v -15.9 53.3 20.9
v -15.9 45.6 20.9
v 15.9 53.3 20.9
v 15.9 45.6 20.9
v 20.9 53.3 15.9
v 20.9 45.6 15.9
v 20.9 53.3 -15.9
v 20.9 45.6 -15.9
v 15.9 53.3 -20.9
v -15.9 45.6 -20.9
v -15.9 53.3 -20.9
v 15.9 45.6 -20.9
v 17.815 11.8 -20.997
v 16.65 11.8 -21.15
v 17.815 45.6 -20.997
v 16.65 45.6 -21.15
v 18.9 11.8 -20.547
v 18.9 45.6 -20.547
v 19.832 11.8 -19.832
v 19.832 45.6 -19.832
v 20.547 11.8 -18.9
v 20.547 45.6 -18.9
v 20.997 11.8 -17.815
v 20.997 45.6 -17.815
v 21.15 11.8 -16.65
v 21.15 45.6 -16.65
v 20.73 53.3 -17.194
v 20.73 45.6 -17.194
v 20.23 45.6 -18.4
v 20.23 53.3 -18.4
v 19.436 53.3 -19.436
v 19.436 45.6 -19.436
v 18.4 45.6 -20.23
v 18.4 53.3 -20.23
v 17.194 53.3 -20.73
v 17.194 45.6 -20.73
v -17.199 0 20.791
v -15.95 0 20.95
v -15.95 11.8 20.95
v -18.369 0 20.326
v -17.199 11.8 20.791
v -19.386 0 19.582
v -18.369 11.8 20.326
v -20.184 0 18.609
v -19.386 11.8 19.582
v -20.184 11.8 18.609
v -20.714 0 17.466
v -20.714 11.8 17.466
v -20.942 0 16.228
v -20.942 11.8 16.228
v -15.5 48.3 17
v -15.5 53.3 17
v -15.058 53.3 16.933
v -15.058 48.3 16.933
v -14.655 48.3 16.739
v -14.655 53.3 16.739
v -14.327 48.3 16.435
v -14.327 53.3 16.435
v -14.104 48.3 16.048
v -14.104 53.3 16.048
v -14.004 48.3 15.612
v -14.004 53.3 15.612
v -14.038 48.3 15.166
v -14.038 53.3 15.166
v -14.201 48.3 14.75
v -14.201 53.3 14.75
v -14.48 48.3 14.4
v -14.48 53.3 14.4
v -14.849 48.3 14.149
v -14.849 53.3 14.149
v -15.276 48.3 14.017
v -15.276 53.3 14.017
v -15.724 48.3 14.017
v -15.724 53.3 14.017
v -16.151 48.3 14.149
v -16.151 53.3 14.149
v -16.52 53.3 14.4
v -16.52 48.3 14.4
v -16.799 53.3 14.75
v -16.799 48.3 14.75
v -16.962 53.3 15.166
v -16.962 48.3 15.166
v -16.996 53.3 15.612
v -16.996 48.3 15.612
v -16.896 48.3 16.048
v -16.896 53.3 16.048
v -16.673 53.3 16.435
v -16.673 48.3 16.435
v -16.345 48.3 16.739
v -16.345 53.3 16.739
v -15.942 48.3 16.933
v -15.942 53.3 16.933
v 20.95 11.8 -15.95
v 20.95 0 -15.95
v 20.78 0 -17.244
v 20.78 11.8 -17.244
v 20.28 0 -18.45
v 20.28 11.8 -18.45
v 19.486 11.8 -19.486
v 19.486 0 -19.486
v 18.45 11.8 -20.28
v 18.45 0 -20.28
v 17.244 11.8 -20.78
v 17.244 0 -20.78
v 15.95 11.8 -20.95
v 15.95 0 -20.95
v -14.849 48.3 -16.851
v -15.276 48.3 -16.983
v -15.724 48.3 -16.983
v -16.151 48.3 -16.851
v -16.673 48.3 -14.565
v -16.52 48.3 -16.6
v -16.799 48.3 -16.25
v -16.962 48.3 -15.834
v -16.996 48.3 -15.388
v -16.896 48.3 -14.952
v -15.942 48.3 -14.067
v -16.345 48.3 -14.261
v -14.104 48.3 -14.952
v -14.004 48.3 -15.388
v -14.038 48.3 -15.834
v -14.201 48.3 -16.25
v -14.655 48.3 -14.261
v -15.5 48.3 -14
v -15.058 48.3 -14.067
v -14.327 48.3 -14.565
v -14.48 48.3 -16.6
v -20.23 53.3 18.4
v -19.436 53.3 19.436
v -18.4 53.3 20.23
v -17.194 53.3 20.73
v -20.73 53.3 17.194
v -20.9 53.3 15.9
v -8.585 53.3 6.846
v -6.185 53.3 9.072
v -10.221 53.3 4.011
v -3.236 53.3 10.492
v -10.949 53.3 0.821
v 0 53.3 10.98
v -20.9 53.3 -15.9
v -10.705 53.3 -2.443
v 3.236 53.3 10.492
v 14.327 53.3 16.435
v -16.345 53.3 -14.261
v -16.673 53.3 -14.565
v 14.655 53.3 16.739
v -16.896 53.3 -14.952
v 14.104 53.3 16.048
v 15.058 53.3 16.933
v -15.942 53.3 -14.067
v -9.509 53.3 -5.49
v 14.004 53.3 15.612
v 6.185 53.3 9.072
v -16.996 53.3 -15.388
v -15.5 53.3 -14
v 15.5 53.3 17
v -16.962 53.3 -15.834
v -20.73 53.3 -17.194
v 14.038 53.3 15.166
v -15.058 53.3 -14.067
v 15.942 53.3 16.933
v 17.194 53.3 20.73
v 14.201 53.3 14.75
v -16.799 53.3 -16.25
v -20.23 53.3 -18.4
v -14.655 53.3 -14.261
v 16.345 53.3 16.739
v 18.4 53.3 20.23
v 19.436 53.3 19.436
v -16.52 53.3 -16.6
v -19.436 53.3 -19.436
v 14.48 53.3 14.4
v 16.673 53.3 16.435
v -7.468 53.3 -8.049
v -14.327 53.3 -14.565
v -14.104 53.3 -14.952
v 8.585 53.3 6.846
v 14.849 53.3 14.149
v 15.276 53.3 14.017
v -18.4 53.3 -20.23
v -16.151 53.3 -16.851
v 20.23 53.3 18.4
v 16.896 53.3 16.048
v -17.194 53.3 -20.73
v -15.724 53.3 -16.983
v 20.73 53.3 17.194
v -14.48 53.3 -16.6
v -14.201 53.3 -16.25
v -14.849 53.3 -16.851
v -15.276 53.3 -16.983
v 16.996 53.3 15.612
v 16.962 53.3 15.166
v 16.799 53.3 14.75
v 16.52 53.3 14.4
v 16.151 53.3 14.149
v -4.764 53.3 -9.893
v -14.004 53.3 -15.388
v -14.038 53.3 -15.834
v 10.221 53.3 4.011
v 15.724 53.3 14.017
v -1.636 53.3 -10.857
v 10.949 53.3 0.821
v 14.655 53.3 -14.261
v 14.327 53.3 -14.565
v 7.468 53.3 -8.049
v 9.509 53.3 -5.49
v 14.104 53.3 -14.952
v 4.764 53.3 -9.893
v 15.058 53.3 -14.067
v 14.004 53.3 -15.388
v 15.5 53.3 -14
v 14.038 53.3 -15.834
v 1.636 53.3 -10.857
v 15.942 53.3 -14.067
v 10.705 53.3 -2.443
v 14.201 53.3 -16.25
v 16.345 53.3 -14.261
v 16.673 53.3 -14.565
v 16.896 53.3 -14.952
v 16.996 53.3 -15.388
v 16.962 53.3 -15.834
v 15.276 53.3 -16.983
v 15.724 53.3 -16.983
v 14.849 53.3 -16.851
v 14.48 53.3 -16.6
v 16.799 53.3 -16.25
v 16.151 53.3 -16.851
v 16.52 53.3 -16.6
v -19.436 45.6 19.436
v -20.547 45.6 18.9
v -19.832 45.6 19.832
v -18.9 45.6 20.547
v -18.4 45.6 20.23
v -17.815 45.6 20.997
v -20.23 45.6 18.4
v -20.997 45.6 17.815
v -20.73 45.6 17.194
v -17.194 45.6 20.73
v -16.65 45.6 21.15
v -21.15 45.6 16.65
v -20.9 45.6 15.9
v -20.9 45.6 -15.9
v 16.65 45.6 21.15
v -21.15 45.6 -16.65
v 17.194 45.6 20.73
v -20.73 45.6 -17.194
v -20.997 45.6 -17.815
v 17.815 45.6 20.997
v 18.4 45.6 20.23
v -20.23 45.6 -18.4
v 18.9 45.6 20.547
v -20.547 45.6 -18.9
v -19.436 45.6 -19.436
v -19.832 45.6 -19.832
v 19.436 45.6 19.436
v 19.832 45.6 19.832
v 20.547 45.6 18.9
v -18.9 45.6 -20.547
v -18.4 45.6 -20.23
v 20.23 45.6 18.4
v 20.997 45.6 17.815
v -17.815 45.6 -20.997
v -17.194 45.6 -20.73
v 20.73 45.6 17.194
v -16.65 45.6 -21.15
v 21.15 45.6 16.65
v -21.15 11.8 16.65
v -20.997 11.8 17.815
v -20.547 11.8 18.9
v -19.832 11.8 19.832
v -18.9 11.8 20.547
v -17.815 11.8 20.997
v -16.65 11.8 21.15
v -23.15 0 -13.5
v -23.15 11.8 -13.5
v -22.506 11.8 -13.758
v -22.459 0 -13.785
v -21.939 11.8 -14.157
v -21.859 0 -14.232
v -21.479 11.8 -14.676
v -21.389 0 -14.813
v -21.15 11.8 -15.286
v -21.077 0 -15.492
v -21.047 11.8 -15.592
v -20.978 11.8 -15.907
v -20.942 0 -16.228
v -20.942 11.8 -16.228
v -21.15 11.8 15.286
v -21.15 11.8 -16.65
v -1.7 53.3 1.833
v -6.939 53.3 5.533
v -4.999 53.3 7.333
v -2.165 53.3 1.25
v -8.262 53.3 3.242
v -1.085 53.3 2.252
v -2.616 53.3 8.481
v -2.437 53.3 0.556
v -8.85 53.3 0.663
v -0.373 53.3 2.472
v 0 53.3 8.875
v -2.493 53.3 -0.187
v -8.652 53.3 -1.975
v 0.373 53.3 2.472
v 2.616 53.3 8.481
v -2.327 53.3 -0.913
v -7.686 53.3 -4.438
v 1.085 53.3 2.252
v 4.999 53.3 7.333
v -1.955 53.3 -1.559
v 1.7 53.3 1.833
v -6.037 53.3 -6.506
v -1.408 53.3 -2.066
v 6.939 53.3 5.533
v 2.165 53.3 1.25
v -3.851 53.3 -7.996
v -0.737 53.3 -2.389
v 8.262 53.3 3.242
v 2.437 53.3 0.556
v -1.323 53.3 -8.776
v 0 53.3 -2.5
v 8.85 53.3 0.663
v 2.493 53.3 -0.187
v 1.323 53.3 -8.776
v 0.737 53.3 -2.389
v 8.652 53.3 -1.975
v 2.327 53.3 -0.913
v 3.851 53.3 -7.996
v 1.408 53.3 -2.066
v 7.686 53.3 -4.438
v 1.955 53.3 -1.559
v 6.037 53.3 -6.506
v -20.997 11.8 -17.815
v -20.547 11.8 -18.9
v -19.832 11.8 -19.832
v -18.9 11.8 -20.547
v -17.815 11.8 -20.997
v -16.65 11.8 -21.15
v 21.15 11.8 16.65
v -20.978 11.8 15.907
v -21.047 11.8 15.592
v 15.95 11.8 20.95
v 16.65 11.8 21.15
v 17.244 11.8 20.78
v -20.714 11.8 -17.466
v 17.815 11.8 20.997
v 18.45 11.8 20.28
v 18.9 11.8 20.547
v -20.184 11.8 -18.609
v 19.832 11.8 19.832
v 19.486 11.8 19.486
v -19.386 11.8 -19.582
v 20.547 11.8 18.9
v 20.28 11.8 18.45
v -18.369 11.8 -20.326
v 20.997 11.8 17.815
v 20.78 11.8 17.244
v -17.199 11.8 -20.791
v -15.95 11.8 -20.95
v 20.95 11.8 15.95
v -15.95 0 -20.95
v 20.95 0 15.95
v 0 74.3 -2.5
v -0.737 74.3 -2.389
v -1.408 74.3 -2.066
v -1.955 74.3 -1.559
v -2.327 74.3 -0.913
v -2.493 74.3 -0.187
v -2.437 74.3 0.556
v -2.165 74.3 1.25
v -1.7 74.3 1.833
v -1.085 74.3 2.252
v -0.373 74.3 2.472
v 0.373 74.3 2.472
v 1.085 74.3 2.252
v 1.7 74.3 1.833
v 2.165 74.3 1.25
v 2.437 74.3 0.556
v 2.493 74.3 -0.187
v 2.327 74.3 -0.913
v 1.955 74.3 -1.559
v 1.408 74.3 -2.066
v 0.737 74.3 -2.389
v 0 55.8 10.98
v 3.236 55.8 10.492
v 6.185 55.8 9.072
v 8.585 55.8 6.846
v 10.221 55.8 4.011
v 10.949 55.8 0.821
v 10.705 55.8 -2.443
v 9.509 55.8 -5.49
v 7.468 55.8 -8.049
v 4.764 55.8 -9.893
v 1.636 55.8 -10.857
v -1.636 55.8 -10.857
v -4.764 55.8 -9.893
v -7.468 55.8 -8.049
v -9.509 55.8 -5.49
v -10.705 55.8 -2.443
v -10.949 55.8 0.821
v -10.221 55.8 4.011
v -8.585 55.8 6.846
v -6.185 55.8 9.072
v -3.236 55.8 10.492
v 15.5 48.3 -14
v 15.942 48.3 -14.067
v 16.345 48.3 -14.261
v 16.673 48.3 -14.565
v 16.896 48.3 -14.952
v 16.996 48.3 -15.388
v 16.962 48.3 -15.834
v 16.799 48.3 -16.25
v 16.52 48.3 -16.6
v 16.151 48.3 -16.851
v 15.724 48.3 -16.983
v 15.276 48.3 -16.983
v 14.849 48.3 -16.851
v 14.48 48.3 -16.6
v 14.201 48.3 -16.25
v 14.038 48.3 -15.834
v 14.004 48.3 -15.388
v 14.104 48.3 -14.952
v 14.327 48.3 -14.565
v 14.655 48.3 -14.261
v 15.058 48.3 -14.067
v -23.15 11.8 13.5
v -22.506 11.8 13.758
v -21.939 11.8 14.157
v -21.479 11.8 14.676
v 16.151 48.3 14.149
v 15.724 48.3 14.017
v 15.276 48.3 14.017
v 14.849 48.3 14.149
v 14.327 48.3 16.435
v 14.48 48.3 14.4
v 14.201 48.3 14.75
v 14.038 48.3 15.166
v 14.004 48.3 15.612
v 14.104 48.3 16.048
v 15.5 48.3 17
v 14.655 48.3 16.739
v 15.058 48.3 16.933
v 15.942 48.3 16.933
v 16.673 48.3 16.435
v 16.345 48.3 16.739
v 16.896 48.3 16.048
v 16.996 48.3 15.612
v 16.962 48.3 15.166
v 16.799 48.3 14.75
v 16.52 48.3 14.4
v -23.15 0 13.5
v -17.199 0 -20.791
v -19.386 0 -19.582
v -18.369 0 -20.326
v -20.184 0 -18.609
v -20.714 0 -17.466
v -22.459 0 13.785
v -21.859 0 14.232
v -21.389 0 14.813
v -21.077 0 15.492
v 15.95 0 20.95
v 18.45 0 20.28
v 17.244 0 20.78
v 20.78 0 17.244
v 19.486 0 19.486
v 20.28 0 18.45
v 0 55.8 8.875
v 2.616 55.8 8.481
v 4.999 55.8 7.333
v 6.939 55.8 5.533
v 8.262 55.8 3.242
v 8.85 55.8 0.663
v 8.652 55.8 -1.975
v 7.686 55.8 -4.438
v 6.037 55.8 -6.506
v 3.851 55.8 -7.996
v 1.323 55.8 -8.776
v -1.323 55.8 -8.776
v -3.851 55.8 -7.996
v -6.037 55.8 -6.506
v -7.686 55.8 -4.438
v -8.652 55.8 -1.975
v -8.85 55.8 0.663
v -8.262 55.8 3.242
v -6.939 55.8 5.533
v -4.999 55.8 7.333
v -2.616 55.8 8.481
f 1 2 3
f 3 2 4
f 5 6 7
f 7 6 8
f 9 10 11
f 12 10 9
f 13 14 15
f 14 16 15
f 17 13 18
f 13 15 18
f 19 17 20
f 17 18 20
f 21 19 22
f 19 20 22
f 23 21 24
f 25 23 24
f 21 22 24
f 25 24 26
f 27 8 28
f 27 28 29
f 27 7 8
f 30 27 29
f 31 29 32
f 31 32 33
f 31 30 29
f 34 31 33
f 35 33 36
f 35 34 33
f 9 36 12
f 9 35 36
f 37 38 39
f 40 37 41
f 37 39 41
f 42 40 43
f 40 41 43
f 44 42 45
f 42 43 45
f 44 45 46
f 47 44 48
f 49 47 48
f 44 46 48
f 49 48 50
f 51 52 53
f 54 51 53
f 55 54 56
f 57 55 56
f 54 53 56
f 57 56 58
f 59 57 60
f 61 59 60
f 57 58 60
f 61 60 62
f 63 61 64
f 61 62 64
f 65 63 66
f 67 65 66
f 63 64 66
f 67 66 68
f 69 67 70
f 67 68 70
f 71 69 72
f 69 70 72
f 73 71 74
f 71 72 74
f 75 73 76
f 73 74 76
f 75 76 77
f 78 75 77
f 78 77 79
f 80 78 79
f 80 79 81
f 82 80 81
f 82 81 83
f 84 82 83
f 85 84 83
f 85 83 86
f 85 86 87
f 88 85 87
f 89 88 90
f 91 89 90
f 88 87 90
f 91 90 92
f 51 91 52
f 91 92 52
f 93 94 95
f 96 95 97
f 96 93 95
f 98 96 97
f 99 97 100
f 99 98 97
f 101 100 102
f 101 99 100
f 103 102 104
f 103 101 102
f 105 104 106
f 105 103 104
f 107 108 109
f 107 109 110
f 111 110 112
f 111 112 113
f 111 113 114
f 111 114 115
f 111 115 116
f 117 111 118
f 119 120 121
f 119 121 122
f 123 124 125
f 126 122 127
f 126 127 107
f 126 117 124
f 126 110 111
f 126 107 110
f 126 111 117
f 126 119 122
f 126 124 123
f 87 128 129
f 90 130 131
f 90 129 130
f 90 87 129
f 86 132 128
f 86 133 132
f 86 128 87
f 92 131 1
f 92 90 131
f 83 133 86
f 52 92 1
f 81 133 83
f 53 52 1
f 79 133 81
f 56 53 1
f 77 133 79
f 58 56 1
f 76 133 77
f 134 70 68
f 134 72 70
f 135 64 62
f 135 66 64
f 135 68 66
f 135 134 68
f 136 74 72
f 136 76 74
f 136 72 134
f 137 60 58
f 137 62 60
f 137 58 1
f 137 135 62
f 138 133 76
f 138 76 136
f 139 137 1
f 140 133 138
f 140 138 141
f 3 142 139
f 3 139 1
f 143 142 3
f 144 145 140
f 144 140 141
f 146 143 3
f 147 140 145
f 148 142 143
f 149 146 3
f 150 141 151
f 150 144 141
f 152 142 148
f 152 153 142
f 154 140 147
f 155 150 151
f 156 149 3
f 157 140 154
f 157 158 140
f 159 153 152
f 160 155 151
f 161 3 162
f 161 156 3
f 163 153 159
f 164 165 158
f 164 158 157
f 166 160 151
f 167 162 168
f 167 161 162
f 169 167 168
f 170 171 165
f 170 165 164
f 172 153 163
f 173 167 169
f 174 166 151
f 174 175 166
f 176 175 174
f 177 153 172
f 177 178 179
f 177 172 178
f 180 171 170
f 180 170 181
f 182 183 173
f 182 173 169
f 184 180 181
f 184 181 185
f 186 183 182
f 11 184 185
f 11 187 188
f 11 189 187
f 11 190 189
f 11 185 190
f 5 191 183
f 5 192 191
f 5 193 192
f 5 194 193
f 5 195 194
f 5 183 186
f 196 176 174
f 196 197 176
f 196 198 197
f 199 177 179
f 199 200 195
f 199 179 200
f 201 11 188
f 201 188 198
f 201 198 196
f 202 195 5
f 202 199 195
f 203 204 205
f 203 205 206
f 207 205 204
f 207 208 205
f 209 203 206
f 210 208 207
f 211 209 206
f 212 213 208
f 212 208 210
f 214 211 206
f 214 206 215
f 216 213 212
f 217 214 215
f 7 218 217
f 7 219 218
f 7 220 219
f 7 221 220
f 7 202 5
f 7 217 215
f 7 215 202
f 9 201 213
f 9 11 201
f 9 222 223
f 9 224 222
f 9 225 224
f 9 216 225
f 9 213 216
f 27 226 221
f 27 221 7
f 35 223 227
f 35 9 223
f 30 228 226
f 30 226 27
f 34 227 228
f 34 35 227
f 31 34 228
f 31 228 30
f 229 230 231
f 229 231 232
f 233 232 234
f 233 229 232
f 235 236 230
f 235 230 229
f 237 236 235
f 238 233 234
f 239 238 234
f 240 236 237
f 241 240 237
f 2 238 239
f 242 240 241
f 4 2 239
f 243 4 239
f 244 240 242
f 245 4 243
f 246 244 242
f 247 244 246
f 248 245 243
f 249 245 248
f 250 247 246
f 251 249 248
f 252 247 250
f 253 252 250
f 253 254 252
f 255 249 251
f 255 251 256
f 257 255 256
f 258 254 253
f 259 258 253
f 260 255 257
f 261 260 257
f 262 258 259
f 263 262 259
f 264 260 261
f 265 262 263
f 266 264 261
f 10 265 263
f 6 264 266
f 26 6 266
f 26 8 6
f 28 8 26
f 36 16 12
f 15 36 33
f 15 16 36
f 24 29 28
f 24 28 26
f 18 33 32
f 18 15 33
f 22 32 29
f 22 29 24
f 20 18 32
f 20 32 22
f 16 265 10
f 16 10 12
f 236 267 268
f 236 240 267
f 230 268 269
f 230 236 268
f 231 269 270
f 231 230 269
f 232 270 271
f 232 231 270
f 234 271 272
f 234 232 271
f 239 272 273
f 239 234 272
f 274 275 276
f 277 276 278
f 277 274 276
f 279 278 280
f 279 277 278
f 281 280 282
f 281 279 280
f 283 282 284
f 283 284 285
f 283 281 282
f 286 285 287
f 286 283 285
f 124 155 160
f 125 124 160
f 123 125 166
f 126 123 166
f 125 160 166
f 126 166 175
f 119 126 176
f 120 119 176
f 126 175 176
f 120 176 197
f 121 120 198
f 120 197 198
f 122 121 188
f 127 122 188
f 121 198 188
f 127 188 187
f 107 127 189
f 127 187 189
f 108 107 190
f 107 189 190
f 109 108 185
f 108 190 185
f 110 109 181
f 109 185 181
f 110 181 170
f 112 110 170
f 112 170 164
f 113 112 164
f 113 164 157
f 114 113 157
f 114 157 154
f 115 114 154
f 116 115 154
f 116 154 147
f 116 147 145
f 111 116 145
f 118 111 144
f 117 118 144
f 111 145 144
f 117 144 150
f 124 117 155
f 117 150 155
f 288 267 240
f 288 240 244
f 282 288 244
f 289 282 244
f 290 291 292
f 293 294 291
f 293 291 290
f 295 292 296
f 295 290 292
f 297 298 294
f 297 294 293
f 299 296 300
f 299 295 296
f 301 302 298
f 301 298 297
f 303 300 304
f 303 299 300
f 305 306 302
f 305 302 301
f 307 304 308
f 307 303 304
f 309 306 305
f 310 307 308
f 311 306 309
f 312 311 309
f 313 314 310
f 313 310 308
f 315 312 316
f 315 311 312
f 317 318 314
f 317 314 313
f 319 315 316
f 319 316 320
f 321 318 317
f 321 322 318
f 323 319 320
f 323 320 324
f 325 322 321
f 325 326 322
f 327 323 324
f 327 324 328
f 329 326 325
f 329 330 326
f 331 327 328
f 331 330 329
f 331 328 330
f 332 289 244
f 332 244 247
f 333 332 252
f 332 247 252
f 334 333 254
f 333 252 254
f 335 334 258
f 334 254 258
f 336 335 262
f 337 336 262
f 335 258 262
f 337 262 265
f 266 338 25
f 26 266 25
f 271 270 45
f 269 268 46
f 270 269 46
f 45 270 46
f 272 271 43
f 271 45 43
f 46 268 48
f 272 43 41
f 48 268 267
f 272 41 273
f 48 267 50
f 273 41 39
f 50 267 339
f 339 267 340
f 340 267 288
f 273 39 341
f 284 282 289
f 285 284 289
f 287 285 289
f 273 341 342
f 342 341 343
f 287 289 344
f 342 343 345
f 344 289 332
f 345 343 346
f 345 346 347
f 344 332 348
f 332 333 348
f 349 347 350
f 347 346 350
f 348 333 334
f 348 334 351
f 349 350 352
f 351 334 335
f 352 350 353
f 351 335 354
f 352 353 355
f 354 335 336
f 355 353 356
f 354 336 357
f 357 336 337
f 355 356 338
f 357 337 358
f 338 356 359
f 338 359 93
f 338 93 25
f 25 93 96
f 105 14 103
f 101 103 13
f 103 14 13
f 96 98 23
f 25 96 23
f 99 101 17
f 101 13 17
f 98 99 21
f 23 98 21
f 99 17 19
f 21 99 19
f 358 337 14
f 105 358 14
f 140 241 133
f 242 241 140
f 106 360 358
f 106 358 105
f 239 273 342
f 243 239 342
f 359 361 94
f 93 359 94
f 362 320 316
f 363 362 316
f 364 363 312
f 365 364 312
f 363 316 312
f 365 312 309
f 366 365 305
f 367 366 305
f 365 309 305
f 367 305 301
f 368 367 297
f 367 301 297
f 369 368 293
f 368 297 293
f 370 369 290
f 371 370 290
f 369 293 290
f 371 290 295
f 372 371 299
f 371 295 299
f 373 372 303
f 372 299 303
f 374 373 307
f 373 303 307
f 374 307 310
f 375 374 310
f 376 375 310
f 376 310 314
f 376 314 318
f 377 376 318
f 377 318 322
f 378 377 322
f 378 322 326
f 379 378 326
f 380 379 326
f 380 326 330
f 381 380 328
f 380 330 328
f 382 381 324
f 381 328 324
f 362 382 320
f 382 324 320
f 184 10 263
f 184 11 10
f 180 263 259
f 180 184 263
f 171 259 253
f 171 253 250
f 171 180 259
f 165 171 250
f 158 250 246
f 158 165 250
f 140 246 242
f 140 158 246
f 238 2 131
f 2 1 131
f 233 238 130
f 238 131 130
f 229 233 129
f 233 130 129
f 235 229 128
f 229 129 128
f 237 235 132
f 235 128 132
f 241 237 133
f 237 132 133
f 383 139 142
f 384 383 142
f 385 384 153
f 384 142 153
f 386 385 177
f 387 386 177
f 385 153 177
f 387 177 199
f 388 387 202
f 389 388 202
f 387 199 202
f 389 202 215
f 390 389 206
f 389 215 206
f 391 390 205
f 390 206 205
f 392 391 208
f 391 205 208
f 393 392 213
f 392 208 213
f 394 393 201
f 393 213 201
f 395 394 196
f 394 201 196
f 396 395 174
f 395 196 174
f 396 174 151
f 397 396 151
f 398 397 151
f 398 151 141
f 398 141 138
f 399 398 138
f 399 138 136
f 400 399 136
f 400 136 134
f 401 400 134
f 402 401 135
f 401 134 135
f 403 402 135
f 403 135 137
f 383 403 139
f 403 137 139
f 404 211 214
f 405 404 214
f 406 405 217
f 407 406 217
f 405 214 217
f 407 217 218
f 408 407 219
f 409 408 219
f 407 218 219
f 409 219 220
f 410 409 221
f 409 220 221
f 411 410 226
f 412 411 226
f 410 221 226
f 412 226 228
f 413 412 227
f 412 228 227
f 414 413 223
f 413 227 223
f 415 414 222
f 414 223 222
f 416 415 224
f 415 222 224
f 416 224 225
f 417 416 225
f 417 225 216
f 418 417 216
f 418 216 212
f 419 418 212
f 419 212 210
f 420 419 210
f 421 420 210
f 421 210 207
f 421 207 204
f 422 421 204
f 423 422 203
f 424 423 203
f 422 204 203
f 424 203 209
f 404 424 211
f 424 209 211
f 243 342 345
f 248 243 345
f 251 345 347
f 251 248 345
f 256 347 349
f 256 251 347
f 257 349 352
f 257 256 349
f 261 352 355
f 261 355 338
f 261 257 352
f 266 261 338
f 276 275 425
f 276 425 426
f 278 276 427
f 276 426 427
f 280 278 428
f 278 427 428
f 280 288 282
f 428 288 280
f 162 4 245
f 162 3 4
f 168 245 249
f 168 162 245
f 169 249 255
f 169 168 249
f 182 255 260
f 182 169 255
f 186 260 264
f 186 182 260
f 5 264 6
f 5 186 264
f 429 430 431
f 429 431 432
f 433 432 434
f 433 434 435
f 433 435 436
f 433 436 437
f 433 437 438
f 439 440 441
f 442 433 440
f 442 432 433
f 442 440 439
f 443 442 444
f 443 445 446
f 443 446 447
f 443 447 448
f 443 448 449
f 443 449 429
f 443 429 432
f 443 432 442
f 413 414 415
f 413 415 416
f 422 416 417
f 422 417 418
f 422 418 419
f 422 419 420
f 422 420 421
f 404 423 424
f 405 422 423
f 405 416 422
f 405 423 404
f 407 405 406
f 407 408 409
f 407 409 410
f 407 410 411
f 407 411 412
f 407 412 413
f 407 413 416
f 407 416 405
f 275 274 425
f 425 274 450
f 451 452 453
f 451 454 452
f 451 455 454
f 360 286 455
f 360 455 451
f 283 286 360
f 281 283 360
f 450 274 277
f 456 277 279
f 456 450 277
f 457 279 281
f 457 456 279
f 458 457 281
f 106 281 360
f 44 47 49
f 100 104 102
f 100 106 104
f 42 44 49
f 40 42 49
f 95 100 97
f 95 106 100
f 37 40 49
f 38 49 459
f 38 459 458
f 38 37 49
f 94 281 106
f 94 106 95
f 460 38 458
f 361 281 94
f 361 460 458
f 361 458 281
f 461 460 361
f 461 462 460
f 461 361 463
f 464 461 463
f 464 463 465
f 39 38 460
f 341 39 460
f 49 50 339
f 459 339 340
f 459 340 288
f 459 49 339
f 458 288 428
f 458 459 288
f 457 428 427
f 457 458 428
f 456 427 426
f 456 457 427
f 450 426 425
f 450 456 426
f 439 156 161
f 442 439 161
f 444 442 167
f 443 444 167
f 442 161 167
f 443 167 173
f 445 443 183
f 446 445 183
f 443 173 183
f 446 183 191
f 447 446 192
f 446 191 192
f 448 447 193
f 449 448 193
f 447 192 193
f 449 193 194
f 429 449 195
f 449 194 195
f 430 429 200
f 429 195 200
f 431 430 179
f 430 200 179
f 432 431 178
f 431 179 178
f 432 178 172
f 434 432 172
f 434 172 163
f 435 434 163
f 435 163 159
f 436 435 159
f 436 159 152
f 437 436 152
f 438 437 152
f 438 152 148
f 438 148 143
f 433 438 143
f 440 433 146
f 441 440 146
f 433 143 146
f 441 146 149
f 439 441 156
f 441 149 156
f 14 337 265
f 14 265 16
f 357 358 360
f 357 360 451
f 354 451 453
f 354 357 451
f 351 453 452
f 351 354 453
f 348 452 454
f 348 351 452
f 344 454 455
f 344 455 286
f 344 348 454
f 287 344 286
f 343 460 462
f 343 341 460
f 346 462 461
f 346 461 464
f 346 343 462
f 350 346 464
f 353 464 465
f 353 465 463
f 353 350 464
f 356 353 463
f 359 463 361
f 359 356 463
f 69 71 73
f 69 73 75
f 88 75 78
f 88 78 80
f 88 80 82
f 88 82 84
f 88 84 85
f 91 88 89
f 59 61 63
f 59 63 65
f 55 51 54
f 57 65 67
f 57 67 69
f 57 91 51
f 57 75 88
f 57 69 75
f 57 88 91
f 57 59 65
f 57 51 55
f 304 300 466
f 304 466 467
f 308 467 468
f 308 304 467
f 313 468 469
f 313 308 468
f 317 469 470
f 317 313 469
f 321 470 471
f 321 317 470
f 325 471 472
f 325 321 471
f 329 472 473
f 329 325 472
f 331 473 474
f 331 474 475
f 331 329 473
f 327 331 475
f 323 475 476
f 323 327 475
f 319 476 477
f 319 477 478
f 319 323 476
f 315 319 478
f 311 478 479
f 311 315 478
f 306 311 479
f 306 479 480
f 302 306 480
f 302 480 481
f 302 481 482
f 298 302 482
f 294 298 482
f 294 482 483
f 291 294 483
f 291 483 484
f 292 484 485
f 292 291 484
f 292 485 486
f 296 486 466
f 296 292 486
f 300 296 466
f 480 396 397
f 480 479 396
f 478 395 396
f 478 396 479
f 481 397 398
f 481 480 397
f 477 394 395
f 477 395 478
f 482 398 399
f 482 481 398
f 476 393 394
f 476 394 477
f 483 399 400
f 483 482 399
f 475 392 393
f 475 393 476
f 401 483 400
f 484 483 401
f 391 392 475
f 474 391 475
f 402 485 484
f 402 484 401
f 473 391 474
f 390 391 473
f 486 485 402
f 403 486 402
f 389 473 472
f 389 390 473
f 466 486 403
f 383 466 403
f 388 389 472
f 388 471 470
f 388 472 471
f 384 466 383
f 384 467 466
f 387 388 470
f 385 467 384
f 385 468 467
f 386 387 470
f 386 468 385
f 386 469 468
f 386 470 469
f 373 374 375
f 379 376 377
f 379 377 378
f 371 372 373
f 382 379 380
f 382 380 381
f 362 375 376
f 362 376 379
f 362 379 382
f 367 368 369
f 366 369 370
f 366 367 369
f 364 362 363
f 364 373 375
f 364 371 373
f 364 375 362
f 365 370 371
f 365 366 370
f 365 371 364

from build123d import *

# Parameters (mm, degrees)
SKETCH1_W           = 41.9
SKETCH1_H           = 41.9
BOSS_EXTRUDE1_DEPTH = 11.8
SKETCH2_W           = 42.3
SKETCH2_H           = 42.3
BOSS_EXTRUDE2_DEPTH = 33.8
SKETCH3_W           = 41.8
SKETCH3_H           = 41.8
BOSS_EXTRUDE3_DEPTH = 7.7
SKETCH4_R           = 10.98
SKETCH4_R_2         = 8.875
BOSS_EXTRUDE4_DEPTH = 2.5
FILLET1_R           = 5
FILLET3_R           = 4.5
SKETCH5_R           = 2.5
BOSS_EXTRUDE5_DEPTH = 21
SKETCH6_R           = 1.5
CUT_EXTRUDE1_DEPTH  = 5
SKETCH7_W           = 2.2
SKETCH7_H           = 27
BOSS_EXTRUDE6_DEPTH = 11.8
FILLET5_R           = 3


with BuildPart() as part:
    # Sketch1 → Boss-Extrude1 (new body)
    with BuildSketch(Plane(origin=(0, 0, 0), x_dir=(1, 0, 0), z_dir=(0, 1, 0))):
        Rectangle(SKETCH1_W, SKETCH1_H)
    extrude(amount=BOSS_EXTRUDE1_DEPTH)

    # Sketch2 → Boss-Extrude2 (add)
    with BuildSketch(Plane(origin=(0, 11.8, 0), x_dir=(1, 0, 0), z_dir=(0, 1, 0))):
        Rectangle(SKETCH2_W, SKETCH2_H)
    extrude(amount=BOSS_EXTRUDE2_DEPTH)

    # Sketch3 → Boss-Extrude3 (add)
    with BuildSketch(Plane(origin=(0, 45.6, 0), x_dir=(1, 0, 0), z_dir=(0, 1, 0))):
        Rectangle(SKETCH3_W, SKETCH3_H)
    extrude(amount=BOSS_EXTRUDE3_DEPTH)

    # Sketch4 → Boss-Extrude4 (add)
    with BuildSketch(Plane(origin=(0, 53.3, 0), x_dir=(1, 0, 0), z_dir=(0, 1, 0))):
        with Locations(Location((0, 0, 0), (0, 0, 270))):
            Circle(SKETCH4_R)
        with Locations(Location((0, 0, 0), (0, 0, 270))):
            Circle(SKETCH4_R_2, mode=Mode.SUBTRACT)
    extrude(amount=BOSS_EXTRUDE4_DEPTH)

    # Fillet1
    fillet1_edges = [part.edges().sort_by_distance(p)[0] for p in [
        (-20.9, 49.45, -20.9),
        (-20.9, 49.45, 20.9),
        (20.9, 49.45, 20.9),
        (20.9, 49.45, -20.9),
        (-20.95, 5.9, -20.95),
        (20.95, 5.9, -20.95),
        (20.95, 5.9, 20.95),
        (-20.95, 5.9, 20.95),
    ]]
    fillet(fillet1_edges, radius=FILLET1_R)

    # Fillet3
    fillet3_edges = [part.edges().sort_by_distance(p)[0] for p in [
        (-21.15, 28.7, -21.15),
        (-21.15, 28.7, 21.15),
        (21.15, 28.7, 21.15),
        (21.15, 28.7, -21.15),
    ]]
    fillet(fillet3_edges, radius=FILLET3_R)

    # Sketch5 → Boss-Extrude5 (add)
    with BuildSketch(Plane(origin=(0, 53.3, 0), x_dir=(1, 0, 0), z_dir=(0, 1, 0))):
        with Locations(Location((0, 0, 0), (0, 0, 90))):
            Circle(SKETCH5_R)
    extrude(amount=BOSS_EXTRUDE5_DEPTH)

    # Sketch6 → Cut-Extrude1 (cut)
    with BuildSketch(Plane(origin=(0, 53.3, 0), x_dir=(1, 0, 0), z_dir=(0, 1, 0))):
        with Locations(Location((-15.5, -15.5, 0), (0, 0, 270))):
            Circle(SKETCH6_R)
        with Locations(Location((-15.5, 15.5, 0), (0, 0, 270))):
            Circle(SKETCH6_R)
        with Locations(Location((15.5, 15.5, 0), (0, 0, 270))):
            Circle(SKETCH6_R)
        with Locations(Location((15.5, -15.5, 0), (0, 0, 270))):
            Circle(SKETCH6_R)
    extrude(amount=-CUT_EXTRUDE1_DEPTH, mode=Mode.SUBTRACT)

    # Sketch7 → Boss-Extrude6 (add)
    with BuildSketch(Plane.XZ):
        with Locations((-22.05, 0)):
            Rectangle(SKETCH7_W, SKETCH7_H)
    extrude(amount=-BOSS_EXTRUDE6_DEPTH)

    # Fillet5
    # the kernel refuses this fillet: 3 mm, written as the material it adds along each edge
    with BuildSketch(Plane(origin=(-20.95, 0, 13.5), x_dir=(0.0028347051318629093, 0, 0.9999959822153364), z_dir=(0, 1, 0))) as fillet5_piece_1:
        with BuildLine():
            CenterArc((2.886280715, -2.99582093), FILLET5_R, 93.02459513, 71.592016422)
            Line((-0.006236351, -2.199991161), (-0.295488058, -2.120408184))
            ThreePointArc((-0.295488058, -2.120408184), (-0.30311697, -1.099145169), (-0.299998795, 0.000850412))
            Line((-0.299998795, 0.000850412), (0.000850412, 0.299998795))
            ThreePointArc((0.000850412, 0.299998795), (2.450840568, 0.293053767), (2.712157439, 0.299582093))
            Line((2.712157439, 0.299582093), (2.727986828, 0))
        make_face()
    extrude(amount=11.8)
    with BuildSketch(Plane(origin=(-20.95, 0, -13.5), x_dir=(-1.0, 0, 2.215601439689644e-12), z_dir=(0, 1, 0))) as fillet5_piece_2:
        with BuildLine():
            CenterArc((2.987627139, -2.894761387), FILLET5_R, 105.22097159, 71.592016422)
            Line((-0.007733038, -2.727975867), (-0.307269056, -2.711297315))
            ThreePointArc((-0.307269056, -2.711297315), (-0.3, -2.45), (-0.3, 0))
            Line((-0.3, 0), (0, 0.3))
            ThreePointArc((0, 0.3), (1.1, 0.3), (2.121237286, 0.289476139))
            Line((2.121237286, 0.289476139), (2.2, 0))
        make_face()
    extrude(amount=11.8)


solid = part.part
